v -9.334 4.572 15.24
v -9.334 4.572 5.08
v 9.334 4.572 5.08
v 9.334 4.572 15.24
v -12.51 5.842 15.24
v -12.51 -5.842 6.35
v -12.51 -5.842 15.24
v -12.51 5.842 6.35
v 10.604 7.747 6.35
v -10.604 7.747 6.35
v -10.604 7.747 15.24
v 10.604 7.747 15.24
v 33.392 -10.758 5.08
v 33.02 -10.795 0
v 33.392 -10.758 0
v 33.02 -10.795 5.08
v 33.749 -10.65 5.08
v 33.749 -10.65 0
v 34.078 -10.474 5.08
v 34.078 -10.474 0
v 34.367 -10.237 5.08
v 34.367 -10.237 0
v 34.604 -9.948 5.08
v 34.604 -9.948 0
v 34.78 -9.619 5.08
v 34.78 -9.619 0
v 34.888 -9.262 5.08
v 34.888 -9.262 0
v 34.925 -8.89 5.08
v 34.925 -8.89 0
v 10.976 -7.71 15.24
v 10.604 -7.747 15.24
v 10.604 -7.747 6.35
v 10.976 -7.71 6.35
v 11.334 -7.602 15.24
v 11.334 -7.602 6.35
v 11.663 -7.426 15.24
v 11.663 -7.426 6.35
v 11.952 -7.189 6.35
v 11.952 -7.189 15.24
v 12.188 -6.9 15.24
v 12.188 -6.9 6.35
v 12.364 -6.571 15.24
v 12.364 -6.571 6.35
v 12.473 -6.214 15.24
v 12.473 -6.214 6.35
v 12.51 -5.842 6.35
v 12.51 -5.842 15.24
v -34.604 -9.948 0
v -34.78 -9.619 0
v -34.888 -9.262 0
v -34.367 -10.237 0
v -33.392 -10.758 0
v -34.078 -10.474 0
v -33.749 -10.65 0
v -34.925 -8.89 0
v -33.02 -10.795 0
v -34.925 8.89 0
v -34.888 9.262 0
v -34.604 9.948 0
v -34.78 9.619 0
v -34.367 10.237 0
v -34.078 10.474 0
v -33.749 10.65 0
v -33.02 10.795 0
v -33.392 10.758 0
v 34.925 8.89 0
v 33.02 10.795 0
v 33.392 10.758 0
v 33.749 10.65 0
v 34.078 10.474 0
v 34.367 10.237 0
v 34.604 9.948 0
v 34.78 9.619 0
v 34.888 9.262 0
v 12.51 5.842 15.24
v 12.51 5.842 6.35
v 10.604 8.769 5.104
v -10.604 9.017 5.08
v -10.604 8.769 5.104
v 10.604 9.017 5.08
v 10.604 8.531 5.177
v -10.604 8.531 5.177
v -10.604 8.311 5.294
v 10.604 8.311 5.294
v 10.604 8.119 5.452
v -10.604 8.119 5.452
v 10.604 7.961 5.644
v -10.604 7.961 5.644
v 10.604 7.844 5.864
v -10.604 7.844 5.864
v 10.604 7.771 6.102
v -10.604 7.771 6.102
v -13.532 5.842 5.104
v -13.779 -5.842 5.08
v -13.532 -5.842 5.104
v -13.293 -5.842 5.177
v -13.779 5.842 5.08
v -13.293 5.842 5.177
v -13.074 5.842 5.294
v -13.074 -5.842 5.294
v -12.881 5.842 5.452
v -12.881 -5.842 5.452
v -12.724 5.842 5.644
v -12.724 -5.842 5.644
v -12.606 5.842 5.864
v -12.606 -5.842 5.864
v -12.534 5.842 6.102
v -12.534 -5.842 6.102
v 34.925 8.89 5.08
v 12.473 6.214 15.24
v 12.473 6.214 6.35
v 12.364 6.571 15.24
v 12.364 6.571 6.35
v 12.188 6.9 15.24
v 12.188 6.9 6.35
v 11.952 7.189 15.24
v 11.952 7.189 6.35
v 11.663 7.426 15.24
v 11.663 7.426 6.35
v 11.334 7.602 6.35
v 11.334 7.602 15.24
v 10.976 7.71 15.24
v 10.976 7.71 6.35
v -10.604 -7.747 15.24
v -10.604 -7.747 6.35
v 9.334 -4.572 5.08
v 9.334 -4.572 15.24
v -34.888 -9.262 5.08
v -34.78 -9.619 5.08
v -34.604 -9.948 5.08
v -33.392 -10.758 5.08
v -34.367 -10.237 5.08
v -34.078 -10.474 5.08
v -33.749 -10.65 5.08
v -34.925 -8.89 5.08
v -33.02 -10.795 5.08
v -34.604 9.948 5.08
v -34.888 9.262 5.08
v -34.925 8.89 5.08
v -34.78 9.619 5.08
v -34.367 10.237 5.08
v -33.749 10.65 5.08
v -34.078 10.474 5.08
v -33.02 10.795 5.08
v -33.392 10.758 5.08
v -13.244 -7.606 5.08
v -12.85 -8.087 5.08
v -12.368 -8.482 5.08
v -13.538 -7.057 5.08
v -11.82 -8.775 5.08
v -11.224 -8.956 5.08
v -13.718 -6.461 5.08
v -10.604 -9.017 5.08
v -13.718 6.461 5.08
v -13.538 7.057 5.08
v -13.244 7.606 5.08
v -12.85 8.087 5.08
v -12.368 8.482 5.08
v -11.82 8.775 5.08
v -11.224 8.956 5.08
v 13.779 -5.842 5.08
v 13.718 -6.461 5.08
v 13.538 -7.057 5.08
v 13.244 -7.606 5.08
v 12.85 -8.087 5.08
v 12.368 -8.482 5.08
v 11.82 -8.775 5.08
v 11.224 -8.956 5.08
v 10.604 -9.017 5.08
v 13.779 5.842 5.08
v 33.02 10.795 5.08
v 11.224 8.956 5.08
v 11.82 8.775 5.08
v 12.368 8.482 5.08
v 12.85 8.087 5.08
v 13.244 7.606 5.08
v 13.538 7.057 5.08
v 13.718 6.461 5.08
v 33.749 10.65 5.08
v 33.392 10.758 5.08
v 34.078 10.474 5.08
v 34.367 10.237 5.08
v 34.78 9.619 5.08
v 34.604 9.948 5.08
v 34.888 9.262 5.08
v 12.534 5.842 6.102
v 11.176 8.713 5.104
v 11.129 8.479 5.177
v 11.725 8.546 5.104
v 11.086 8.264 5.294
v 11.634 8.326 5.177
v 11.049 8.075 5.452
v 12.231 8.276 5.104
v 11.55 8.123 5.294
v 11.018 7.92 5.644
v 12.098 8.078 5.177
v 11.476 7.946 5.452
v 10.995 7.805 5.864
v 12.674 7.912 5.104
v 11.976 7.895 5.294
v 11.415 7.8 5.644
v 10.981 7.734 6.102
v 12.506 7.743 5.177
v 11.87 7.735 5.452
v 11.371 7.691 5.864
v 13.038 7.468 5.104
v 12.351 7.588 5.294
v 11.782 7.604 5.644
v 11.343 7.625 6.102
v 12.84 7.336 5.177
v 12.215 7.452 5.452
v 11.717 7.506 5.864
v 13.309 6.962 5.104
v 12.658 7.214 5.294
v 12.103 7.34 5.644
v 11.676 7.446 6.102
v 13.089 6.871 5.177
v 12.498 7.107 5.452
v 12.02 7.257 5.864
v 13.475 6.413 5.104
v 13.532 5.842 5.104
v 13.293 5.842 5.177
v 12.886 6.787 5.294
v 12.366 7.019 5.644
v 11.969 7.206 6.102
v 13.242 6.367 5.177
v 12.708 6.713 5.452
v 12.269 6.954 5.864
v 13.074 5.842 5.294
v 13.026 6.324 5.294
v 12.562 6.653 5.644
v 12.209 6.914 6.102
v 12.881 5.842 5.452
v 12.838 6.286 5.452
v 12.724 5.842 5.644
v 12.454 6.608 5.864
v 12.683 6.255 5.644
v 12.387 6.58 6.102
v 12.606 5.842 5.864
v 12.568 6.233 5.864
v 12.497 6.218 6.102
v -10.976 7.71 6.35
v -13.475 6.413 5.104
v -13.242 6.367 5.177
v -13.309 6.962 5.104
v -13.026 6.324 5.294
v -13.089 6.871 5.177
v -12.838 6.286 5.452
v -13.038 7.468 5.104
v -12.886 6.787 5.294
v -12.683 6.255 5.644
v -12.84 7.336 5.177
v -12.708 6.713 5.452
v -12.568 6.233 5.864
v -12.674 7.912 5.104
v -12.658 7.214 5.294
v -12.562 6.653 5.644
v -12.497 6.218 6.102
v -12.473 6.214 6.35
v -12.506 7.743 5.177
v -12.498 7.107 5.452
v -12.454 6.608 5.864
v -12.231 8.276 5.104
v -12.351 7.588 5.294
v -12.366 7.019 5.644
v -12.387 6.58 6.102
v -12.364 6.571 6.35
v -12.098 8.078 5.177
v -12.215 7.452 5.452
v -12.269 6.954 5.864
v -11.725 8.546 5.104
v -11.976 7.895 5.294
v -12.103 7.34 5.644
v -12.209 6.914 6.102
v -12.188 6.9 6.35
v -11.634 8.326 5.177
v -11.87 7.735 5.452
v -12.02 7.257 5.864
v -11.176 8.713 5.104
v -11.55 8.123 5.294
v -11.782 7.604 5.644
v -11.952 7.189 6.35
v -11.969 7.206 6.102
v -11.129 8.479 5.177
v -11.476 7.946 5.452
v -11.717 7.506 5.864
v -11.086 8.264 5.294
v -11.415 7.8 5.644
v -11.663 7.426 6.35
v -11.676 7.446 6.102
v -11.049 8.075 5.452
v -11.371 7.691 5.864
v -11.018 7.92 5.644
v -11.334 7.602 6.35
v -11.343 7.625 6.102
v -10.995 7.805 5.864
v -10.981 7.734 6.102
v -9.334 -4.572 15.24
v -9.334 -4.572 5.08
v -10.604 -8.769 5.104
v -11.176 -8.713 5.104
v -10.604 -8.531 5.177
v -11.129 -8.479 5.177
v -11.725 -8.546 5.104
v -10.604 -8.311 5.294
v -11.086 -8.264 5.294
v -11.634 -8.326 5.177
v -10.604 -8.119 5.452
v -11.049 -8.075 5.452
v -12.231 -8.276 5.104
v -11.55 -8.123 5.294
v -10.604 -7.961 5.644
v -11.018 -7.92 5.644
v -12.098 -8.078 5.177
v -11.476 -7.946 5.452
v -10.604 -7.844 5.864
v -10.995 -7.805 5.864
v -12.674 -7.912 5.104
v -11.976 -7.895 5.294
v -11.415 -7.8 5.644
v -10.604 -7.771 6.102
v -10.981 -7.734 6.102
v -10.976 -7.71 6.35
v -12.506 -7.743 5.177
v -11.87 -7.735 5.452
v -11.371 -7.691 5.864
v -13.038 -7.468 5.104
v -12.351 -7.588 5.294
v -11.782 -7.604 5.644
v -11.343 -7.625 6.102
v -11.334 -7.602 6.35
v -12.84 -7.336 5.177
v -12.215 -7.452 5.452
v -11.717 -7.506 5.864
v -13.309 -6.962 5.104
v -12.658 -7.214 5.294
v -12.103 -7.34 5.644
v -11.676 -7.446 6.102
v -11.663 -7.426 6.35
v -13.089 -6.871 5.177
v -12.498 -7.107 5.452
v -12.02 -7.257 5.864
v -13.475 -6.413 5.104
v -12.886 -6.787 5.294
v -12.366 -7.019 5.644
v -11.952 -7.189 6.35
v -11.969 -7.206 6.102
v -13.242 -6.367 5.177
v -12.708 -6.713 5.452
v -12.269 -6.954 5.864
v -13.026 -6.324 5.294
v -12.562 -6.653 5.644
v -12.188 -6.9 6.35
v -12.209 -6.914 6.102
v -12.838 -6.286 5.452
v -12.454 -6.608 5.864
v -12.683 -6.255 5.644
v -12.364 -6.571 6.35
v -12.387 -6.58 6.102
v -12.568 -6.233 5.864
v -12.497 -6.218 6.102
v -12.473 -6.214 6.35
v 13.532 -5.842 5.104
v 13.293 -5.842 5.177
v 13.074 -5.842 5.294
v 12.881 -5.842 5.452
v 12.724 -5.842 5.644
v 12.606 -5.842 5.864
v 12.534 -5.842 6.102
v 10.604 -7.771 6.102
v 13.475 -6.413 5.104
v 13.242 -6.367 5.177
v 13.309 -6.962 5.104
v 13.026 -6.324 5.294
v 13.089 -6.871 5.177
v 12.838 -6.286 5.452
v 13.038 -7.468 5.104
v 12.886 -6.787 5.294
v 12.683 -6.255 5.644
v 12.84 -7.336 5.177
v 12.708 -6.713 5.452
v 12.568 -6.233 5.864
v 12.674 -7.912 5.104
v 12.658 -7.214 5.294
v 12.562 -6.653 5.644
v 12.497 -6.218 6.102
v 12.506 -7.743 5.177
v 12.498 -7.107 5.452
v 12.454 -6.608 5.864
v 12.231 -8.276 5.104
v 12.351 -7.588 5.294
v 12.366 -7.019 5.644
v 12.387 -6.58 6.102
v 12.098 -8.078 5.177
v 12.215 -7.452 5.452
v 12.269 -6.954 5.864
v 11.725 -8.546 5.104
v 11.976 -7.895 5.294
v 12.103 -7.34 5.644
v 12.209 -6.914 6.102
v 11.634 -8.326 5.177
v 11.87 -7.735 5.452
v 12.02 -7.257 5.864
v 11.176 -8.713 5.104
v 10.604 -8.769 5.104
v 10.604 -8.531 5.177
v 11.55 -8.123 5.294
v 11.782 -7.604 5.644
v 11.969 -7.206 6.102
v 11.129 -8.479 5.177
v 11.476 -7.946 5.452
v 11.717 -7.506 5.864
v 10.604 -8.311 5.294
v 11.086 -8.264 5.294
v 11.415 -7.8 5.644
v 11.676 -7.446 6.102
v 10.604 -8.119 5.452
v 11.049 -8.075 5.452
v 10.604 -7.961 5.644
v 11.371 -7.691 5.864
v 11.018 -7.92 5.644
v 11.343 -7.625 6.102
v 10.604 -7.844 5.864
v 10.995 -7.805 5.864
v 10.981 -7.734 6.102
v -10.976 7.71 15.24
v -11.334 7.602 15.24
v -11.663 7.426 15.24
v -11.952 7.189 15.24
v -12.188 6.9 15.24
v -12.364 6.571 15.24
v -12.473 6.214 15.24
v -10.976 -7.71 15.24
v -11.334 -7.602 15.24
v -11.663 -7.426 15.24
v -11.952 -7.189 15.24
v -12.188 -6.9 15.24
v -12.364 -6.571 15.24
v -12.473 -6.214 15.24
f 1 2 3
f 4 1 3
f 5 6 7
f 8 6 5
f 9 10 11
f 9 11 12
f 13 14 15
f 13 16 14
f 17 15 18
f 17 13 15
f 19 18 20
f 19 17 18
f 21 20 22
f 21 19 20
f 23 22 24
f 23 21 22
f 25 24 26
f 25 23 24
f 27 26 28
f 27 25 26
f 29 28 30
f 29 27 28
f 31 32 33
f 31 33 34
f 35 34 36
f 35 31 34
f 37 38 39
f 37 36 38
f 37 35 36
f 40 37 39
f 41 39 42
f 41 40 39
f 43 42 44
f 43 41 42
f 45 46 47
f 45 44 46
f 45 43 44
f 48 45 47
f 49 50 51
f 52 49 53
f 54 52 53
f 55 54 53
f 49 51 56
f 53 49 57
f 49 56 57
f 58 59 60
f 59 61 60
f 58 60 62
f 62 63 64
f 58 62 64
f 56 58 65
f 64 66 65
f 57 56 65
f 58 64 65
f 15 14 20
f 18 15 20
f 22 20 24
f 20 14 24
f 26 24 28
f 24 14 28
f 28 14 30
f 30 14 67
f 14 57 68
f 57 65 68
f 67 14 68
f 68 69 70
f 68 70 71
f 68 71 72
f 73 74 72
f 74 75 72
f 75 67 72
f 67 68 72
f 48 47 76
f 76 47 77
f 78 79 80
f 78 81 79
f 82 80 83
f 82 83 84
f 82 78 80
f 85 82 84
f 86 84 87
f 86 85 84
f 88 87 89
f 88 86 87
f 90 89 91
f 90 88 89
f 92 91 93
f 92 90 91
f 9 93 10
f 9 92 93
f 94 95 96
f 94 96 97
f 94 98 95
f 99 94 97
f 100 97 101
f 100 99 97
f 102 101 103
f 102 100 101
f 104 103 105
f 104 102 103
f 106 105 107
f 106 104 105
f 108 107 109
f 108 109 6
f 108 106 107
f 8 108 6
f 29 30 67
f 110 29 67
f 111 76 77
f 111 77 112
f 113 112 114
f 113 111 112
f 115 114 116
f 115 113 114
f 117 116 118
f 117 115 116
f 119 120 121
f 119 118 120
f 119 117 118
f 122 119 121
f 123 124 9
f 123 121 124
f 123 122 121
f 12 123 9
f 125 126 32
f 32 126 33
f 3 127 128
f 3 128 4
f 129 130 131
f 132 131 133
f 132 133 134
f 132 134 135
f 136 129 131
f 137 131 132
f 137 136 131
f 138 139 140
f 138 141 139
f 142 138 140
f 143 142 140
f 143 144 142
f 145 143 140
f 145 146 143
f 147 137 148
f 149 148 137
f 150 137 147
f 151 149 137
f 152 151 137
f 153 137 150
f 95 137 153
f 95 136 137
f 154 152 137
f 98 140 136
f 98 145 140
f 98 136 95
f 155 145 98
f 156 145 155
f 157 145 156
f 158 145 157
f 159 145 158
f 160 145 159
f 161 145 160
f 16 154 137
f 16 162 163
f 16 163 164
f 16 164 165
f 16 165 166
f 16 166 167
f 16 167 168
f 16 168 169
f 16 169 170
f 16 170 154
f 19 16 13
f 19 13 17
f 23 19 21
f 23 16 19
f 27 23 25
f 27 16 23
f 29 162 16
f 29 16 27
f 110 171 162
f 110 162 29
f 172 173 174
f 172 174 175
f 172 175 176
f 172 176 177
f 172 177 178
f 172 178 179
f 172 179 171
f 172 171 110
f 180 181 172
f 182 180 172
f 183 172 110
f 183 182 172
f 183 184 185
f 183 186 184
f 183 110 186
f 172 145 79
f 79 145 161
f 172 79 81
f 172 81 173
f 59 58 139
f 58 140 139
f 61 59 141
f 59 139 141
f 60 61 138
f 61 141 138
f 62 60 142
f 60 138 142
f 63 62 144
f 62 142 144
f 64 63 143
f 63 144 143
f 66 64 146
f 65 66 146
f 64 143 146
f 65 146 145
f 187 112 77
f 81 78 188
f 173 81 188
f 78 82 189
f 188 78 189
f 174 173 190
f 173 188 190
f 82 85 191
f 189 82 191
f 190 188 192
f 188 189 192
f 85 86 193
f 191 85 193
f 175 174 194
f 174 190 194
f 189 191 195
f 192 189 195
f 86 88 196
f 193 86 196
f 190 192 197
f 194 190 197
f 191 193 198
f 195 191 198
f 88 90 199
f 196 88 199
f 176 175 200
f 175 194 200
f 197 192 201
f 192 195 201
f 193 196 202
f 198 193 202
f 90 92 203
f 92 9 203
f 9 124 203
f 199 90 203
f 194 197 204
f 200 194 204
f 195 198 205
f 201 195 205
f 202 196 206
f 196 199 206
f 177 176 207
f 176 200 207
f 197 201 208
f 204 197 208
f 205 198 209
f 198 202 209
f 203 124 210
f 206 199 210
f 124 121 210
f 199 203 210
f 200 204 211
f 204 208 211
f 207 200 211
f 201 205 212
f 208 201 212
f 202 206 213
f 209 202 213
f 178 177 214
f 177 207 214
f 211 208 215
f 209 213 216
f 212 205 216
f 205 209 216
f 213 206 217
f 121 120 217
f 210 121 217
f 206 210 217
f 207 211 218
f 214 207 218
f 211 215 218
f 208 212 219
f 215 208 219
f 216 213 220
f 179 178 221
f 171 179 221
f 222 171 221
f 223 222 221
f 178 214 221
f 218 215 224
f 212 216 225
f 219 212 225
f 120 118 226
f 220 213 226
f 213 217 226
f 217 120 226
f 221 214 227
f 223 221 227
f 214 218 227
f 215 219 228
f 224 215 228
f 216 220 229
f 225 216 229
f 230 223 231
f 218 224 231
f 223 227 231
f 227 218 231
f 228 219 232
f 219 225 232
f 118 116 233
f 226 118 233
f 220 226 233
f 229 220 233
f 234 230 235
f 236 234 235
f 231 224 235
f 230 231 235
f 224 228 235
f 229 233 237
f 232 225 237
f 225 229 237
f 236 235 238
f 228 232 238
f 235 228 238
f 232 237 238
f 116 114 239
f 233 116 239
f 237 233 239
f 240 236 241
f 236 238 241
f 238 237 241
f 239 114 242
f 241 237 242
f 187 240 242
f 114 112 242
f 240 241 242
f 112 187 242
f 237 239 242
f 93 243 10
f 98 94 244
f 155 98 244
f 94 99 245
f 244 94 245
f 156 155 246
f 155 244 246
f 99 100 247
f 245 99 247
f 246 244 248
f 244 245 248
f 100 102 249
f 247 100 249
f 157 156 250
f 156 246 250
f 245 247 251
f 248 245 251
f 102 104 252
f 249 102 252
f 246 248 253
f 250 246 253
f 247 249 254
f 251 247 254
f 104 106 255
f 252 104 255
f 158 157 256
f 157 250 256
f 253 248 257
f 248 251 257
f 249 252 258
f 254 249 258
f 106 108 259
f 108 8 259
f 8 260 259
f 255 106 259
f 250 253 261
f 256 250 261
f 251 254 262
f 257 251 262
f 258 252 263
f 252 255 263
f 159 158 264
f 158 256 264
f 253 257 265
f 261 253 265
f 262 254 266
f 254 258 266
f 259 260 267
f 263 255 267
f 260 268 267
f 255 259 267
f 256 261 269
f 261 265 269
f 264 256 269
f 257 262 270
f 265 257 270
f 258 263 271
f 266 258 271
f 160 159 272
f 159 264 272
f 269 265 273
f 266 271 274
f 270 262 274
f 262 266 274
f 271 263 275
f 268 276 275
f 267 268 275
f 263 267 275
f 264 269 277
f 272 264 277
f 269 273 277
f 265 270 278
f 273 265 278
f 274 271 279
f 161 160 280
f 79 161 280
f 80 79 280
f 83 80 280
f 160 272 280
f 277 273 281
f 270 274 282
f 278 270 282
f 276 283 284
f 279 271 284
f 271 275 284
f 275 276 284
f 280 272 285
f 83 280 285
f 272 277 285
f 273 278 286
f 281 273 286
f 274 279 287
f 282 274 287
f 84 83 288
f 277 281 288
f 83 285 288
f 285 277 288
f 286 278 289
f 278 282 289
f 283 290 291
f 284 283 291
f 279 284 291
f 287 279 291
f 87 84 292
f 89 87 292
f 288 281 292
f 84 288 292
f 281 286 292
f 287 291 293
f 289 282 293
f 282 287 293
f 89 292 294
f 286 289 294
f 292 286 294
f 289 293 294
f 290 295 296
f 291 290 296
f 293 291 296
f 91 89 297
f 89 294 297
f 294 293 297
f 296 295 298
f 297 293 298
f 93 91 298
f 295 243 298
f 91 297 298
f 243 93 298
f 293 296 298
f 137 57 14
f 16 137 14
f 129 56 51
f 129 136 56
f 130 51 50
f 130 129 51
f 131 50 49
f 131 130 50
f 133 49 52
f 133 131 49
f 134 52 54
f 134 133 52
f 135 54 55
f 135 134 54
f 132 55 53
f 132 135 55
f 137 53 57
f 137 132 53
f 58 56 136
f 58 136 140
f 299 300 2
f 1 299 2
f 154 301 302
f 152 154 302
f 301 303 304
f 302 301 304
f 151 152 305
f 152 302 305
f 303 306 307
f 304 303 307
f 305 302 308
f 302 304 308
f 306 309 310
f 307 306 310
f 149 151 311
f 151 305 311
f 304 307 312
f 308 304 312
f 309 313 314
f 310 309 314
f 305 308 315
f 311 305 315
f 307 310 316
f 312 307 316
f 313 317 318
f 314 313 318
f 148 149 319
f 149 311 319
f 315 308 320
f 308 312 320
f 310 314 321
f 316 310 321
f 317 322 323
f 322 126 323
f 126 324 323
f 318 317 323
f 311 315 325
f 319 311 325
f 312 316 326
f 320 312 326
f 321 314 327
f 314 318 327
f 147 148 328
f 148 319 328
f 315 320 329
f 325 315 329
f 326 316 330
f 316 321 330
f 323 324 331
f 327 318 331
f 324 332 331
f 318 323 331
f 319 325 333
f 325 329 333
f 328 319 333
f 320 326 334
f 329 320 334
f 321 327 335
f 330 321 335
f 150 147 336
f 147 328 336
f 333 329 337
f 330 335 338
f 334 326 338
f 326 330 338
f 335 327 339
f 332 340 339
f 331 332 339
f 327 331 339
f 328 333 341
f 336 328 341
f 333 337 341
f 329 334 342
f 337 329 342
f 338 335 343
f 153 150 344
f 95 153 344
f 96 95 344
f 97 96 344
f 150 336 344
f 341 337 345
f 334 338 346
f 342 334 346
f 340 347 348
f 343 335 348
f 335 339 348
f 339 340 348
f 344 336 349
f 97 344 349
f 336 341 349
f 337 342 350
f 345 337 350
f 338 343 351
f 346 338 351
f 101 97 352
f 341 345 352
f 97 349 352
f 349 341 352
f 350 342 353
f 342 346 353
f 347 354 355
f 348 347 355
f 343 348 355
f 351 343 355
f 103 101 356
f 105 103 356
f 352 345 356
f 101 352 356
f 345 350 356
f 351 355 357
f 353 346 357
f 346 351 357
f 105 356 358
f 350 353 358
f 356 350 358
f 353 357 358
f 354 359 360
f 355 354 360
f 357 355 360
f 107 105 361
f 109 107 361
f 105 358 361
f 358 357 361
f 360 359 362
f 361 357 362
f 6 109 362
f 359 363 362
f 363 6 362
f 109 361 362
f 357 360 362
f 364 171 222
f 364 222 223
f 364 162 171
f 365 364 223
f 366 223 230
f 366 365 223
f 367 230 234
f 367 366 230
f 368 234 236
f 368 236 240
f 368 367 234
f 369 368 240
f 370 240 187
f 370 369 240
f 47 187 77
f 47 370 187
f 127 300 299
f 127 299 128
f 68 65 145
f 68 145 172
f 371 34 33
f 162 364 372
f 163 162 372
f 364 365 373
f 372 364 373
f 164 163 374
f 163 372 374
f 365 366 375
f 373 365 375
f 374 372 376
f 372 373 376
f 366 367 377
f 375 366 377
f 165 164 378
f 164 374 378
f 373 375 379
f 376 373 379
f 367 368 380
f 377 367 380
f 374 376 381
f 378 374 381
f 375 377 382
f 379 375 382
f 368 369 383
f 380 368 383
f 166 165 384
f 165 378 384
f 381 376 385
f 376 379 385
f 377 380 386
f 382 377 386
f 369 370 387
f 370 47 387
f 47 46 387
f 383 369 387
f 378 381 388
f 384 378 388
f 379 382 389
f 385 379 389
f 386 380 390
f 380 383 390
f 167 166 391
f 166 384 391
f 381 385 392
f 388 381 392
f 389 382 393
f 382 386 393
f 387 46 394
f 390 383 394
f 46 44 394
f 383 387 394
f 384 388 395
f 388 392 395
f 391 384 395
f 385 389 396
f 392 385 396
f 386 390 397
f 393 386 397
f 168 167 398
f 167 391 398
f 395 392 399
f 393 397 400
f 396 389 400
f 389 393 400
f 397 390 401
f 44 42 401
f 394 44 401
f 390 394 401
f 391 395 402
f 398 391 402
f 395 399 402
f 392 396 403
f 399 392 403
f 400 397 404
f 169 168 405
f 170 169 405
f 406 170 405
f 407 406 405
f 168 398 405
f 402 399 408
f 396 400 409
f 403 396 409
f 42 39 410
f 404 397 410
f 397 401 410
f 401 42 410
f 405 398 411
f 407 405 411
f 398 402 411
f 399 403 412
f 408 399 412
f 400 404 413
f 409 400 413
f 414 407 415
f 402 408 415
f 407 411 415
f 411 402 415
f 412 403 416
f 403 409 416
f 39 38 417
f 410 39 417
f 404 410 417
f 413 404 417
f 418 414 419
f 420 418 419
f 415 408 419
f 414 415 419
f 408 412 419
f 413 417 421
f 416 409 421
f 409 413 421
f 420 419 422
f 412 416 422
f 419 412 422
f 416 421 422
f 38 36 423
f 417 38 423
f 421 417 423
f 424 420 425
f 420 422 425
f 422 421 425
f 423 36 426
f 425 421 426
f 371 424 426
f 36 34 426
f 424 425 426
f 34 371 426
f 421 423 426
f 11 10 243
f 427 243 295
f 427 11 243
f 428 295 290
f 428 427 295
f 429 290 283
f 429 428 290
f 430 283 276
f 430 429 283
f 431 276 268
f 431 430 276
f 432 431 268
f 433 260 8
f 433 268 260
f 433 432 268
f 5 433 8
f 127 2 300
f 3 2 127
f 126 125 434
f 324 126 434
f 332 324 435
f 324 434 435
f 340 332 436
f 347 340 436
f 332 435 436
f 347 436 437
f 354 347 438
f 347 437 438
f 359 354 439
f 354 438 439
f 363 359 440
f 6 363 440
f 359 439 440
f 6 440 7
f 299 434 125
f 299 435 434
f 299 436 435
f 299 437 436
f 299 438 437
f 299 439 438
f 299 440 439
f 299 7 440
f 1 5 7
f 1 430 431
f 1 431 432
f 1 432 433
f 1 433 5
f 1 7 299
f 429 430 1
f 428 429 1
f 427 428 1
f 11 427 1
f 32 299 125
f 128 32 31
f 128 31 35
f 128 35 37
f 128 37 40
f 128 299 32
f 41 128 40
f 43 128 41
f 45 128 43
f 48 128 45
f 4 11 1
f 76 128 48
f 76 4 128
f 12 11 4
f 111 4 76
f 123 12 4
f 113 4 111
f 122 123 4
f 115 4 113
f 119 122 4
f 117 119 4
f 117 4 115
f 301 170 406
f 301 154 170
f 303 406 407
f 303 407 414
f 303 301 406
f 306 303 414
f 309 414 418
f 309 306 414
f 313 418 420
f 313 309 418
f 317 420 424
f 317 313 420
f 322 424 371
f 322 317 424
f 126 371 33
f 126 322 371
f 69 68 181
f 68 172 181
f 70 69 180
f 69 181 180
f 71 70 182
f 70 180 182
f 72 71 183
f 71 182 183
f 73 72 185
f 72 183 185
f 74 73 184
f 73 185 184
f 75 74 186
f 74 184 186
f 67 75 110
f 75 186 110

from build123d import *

# Parameters (mm, degrees)
SKETCH1_W           = 69.85
SKETCH1_H           = 21.59
BOSS_EXTRUDE1_DEPTH = 5.08
SKETCH2_W           = 25.019
SKETCH2_H           = 15.494
SKETCH2_W_2         = 18.669
SKETCH2_H_2         = 9.144
BOSS_EXTRUDE2_DEPTH = 10.16
FILLET2_R           = 1.905
FILLET3_R           = 1.27


with BuildPart() as part:
    # Sketch1 → Boss-Extrude1 (new body)
    with BuildSketch(Plane.XY):
        Rectangle(SKETCH1_W, SKETCH1_H)
    extrude(amount=BOSS_EXTRUDE1_DEPTH)

    # Sketch2 → Boss-Extrude2 (add)
    with BuildSketch(Plane.XY.offset(5.08)):
        Rectangle(SKETCH2_W, SKETCH2_H)
        Rectangle(SKETCH2_W_2, SKETCH2_H_2, mode=Mode.SUBTRACT)
    extrude(amount=BOSS_EXTRUDE2_DEPTH)

    # Fillet2
    fillet2_edges = [part.edges().sort_by_distance(p)[0] for p in [
        (12.5095, -7.747, 10.16),
        (12.5095, 7.747, 10.16),
        (-12.5095, 7.747, 10.16),
        (-12.5095, -7.747, 10.16),
        (34.925, -10.795, 2.54),
        (-34.925, -10.795, 2.54),
        (-34.925, 10.795, 2.54),
        (34.925, 10.795, 2.54),
    ]]
    fillet(fillet2_edges, radius=FILLET2_R)

    # Fillet3
    fillet3_edges = [part.edges().sort_by_distance(p)[0] for p in [
        (-12.5095, 0, 5.08),
        (0, 7.747, 5.08),
        (12.5095, 0, 5.08),
        (0, -7.747, 5.08),
        (-11.951538418, 7.189038418, 5.08),
        (11.951538418, 7.189038418, 5.08),
        (11.951538418, -7.189038418, 5.08),
        (-11.951538418, -7.189038418, 5.08),
    ]]
    fillet(fillet3_edges, radius=FILLET3_R)


solid = part.part
